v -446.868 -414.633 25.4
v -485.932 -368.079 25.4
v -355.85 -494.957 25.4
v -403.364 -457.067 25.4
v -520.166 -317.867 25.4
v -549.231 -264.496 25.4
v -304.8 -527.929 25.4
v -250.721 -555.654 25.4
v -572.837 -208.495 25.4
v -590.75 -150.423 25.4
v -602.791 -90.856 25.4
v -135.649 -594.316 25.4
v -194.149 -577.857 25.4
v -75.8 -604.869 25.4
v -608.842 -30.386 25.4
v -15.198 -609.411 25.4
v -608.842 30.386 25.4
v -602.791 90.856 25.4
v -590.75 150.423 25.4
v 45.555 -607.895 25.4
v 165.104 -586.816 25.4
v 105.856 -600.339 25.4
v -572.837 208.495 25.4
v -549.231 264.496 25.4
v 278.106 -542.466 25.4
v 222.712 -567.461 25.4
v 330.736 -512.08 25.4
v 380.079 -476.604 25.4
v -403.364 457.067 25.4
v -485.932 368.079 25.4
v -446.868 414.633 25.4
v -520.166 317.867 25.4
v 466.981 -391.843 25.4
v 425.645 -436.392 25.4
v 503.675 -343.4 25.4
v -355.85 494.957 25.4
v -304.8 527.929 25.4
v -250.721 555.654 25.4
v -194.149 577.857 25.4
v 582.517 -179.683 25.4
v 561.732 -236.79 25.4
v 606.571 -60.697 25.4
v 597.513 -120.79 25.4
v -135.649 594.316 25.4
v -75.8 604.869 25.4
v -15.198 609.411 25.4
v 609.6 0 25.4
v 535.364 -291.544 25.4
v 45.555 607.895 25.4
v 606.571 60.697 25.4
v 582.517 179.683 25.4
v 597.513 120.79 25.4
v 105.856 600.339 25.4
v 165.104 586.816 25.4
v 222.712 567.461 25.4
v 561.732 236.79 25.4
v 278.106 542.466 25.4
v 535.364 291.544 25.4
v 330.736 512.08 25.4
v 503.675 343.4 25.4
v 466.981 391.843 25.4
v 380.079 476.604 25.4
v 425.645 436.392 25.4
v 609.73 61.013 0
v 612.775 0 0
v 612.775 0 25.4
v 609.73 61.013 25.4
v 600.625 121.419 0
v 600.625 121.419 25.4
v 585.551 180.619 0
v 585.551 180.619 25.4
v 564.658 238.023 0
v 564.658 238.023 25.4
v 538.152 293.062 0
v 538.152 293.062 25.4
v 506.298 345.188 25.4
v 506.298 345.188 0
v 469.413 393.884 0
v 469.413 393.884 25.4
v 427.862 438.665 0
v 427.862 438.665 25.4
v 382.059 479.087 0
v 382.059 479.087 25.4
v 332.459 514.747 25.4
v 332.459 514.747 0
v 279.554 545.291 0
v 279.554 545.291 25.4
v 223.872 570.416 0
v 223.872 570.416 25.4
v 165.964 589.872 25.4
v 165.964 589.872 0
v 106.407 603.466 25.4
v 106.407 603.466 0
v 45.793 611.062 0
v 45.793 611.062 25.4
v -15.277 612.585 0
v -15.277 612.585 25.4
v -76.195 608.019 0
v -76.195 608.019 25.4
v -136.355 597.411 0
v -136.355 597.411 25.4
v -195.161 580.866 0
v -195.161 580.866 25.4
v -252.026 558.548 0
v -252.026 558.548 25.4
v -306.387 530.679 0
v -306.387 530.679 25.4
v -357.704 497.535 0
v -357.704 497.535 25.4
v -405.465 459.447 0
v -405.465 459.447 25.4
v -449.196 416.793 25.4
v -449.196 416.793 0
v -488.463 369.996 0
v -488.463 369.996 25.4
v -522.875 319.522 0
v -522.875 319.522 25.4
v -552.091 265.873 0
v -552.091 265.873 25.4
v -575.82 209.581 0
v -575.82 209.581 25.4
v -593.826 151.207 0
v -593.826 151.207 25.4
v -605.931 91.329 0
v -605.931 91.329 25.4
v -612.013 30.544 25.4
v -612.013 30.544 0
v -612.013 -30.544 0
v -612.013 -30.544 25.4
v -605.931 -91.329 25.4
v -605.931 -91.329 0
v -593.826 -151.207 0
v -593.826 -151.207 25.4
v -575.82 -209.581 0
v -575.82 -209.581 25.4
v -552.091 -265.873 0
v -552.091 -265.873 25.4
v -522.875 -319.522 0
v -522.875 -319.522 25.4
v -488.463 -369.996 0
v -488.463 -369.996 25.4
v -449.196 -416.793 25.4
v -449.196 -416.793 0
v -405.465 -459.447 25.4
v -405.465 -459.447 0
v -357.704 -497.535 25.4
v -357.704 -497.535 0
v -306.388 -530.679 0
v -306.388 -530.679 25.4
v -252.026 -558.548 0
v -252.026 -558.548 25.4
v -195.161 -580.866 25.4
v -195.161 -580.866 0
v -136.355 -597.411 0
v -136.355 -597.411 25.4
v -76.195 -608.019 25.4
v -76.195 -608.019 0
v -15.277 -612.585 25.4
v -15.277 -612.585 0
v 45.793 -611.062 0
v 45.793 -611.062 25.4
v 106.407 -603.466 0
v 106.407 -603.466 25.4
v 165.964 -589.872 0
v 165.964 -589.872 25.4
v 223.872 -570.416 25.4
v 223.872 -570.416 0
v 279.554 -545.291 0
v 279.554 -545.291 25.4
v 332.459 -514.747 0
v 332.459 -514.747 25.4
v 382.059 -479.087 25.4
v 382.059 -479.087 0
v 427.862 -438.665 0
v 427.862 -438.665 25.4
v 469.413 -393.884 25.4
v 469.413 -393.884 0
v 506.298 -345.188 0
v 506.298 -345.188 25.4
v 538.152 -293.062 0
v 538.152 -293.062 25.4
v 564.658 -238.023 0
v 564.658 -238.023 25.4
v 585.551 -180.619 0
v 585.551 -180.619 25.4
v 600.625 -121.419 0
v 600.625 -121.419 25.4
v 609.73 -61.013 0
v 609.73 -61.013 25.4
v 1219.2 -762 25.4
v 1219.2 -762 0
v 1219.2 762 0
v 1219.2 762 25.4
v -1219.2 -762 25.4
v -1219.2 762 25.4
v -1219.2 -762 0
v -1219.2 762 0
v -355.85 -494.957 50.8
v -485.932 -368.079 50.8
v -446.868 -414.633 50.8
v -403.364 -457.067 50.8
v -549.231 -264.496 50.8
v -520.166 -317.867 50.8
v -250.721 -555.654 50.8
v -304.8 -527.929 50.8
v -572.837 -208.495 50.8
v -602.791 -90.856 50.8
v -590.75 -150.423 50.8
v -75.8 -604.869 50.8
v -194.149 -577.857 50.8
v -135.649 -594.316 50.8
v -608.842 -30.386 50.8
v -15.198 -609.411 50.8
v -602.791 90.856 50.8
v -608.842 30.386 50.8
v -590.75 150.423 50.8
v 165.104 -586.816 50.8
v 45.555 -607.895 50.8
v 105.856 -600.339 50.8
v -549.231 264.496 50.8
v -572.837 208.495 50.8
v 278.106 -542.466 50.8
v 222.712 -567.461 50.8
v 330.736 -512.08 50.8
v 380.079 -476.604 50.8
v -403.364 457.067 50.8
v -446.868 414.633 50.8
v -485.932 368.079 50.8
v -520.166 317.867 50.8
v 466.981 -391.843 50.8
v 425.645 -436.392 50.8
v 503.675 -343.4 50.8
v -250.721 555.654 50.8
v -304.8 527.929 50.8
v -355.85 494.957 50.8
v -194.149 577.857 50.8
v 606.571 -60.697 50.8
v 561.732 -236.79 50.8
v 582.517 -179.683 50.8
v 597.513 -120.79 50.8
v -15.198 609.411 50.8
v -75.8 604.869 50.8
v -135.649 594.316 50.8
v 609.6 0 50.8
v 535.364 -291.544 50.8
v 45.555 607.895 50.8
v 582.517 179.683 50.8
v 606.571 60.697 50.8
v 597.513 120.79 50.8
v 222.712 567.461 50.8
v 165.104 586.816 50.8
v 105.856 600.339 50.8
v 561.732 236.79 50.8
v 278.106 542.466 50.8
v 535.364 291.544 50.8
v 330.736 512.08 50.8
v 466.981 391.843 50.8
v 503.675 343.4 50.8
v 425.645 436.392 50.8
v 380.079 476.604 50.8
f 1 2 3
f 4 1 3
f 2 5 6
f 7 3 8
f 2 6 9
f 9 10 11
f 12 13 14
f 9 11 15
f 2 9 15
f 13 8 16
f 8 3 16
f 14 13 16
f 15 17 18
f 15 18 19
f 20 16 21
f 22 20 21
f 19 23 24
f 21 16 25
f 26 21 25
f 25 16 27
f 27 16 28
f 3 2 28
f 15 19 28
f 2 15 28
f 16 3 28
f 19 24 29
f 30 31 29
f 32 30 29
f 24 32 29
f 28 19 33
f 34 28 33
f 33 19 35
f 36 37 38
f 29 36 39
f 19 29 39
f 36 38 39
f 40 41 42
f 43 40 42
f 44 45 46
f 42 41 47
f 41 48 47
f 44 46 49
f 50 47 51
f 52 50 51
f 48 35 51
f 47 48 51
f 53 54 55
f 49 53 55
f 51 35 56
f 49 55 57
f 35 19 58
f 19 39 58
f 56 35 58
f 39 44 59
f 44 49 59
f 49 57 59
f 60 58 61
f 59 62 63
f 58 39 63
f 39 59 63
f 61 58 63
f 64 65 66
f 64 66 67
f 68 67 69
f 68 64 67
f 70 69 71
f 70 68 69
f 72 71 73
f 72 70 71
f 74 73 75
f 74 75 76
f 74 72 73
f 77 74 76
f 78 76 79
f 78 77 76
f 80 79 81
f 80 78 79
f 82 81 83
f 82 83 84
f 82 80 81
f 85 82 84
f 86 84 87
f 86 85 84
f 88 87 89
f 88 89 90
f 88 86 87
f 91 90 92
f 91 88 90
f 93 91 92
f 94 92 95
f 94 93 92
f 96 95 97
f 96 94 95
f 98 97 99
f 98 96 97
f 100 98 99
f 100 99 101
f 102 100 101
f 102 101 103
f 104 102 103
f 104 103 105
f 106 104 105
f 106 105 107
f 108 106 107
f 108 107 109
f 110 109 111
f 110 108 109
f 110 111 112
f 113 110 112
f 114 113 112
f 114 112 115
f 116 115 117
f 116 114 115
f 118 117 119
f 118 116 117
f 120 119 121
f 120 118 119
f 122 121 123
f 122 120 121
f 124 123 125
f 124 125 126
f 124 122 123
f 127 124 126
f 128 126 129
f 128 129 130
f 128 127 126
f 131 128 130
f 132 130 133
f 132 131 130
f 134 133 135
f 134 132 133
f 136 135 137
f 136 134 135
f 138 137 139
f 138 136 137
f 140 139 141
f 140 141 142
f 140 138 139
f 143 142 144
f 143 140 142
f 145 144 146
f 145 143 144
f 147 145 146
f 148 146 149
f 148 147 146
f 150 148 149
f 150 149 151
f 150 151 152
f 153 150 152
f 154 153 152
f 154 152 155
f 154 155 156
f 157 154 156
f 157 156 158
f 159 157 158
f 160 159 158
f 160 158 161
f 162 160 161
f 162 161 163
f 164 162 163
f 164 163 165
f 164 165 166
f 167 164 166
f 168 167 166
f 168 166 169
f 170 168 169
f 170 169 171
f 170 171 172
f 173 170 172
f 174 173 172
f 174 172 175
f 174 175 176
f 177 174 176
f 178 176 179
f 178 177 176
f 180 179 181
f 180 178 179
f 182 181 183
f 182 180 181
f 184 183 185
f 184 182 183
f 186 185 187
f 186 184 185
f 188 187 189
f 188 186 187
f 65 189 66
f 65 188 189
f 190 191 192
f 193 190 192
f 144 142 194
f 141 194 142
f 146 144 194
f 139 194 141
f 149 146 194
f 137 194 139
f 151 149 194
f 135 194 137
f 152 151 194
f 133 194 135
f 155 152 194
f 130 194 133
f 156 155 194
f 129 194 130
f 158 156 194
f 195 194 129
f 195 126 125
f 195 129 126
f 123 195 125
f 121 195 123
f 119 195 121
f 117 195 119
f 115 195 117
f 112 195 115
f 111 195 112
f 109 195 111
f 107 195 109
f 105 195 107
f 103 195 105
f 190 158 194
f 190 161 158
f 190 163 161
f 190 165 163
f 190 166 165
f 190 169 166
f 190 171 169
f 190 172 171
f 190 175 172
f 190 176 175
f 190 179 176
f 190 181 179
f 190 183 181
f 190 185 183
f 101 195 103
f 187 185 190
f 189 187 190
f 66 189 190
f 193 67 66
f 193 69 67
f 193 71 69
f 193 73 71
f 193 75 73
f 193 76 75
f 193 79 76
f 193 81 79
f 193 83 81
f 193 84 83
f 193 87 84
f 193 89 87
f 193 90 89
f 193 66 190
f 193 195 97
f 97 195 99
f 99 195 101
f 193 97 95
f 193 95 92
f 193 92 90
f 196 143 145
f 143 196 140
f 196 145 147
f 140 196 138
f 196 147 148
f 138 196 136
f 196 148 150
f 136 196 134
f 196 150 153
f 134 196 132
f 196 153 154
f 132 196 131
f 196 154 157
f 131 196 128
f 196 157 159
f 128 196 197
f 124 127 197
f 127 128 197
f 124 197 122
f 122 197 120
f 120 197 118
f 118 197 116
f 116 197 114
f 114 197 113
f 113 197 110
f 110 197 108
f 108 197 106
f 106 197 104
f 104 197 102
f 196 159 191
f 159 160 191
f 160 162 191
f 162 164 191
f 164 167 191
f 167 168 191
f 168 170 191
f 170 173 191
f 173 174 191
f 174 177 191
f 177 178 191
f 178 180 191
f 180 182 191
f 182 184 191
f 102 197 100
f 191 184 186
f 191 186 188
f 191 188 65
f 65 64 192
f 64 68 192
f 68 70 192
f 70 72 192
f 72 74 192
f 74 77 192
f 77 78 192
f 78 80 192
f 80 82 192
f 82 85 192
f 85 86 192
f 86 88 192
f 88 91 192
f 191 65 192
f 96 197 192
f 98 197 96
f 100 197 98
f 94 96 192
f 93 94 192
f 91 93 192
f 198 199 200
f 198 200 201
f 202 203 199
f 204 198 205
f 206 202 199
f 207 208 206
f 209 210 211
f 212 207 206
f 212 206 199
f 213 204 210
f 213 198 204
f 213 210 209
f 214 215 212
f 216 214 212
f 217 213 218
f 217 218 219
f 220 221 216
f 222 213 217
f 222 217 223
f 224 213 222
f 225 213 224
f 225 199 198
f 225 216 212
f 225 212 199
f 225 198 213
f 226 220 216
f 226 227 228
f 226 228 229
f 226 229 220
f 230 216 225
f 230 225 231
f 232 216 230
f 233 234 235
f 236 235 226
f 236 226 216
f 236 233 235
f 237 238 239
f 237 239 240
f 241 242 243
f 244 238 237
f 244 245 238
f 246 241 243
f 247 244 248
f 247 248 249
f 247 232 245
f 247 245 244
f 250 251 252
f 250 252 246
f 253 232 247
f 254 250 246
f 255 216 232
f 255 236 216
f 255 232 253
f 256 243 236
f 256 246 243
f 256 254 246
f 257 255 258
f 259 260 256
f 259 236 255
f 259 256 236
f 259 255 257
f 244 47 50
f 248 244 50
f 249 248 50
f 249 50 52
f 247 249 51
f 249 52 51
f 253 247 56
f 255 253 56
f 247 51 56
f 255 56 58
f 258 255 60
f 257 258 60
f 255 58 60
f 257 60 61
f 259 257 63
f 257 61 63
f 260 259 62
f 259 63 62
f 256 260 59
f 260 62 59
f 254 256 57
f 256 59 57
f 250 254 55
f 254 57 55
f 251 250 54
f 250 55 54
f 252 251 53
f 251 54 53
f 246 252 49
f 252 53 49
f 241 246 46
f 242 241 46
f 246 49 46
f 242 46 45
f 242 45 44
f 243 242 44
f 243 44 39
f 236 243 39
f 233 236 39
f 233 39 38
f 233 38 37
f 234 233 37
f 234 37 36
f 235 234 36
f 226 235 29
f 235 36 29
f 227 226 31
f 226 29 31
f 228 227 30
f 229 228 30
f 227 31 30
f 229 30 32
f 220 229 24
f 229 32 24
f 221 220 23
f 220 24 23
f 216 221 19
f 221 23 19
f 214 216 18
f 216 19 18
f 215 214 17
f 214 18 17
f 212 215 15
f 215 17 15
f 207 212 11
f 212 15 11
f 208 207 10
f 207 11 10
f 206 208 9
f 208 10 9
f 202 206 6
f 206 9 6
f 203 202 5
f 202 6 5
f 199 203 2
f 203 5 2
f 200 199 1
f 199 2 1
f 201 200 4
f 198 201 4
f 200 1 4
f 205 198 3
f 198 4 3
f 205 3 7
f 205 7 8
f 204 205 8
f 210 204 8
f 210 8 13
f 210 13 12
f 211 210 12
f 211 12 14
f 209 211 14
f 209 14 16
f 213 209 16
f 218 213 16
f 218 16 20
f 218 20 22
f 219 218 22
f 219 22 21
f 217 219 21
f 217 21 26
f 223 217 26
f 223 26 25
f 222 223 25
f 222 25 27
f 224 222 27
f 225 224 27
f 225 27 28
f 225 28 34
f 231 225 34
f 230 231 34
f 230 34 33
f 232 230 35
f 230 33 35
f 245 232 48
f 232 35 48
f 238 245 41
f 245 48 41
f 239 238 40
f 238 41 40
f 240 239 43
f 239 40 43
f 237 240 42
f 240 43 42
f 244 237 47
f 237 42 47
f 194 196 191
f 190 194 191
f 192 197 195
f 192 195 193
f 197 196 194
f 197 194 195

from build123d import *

# Parameters (mm, degrees)
F0_W     = 2438.4
F0_H     = 1524
F0_R     = 612.775
F1_DEPTH = 25.4
F2_R     = 609.6
F3_DEPTH = 25.4


with BuildPart() as f1:
    # F0 (on Top) → F1 (new body)
    with BuildSketch(Plane.XY):
        Rectangle(F0_W, F0_H)
        Circle(F0_R, mode=Mode.SUBTRACT)
    extrude(amount=F1_DEPTH)


with BuildPart() as f3:
    # F2 (on face) → F3 (new body)
    with BuildSketch(Plane.XY.offset(25.4)):
        Circle(F2_R)
    extrude(amount=F3_DEPTH)


solid = Compound([f1.part, f3.part])
